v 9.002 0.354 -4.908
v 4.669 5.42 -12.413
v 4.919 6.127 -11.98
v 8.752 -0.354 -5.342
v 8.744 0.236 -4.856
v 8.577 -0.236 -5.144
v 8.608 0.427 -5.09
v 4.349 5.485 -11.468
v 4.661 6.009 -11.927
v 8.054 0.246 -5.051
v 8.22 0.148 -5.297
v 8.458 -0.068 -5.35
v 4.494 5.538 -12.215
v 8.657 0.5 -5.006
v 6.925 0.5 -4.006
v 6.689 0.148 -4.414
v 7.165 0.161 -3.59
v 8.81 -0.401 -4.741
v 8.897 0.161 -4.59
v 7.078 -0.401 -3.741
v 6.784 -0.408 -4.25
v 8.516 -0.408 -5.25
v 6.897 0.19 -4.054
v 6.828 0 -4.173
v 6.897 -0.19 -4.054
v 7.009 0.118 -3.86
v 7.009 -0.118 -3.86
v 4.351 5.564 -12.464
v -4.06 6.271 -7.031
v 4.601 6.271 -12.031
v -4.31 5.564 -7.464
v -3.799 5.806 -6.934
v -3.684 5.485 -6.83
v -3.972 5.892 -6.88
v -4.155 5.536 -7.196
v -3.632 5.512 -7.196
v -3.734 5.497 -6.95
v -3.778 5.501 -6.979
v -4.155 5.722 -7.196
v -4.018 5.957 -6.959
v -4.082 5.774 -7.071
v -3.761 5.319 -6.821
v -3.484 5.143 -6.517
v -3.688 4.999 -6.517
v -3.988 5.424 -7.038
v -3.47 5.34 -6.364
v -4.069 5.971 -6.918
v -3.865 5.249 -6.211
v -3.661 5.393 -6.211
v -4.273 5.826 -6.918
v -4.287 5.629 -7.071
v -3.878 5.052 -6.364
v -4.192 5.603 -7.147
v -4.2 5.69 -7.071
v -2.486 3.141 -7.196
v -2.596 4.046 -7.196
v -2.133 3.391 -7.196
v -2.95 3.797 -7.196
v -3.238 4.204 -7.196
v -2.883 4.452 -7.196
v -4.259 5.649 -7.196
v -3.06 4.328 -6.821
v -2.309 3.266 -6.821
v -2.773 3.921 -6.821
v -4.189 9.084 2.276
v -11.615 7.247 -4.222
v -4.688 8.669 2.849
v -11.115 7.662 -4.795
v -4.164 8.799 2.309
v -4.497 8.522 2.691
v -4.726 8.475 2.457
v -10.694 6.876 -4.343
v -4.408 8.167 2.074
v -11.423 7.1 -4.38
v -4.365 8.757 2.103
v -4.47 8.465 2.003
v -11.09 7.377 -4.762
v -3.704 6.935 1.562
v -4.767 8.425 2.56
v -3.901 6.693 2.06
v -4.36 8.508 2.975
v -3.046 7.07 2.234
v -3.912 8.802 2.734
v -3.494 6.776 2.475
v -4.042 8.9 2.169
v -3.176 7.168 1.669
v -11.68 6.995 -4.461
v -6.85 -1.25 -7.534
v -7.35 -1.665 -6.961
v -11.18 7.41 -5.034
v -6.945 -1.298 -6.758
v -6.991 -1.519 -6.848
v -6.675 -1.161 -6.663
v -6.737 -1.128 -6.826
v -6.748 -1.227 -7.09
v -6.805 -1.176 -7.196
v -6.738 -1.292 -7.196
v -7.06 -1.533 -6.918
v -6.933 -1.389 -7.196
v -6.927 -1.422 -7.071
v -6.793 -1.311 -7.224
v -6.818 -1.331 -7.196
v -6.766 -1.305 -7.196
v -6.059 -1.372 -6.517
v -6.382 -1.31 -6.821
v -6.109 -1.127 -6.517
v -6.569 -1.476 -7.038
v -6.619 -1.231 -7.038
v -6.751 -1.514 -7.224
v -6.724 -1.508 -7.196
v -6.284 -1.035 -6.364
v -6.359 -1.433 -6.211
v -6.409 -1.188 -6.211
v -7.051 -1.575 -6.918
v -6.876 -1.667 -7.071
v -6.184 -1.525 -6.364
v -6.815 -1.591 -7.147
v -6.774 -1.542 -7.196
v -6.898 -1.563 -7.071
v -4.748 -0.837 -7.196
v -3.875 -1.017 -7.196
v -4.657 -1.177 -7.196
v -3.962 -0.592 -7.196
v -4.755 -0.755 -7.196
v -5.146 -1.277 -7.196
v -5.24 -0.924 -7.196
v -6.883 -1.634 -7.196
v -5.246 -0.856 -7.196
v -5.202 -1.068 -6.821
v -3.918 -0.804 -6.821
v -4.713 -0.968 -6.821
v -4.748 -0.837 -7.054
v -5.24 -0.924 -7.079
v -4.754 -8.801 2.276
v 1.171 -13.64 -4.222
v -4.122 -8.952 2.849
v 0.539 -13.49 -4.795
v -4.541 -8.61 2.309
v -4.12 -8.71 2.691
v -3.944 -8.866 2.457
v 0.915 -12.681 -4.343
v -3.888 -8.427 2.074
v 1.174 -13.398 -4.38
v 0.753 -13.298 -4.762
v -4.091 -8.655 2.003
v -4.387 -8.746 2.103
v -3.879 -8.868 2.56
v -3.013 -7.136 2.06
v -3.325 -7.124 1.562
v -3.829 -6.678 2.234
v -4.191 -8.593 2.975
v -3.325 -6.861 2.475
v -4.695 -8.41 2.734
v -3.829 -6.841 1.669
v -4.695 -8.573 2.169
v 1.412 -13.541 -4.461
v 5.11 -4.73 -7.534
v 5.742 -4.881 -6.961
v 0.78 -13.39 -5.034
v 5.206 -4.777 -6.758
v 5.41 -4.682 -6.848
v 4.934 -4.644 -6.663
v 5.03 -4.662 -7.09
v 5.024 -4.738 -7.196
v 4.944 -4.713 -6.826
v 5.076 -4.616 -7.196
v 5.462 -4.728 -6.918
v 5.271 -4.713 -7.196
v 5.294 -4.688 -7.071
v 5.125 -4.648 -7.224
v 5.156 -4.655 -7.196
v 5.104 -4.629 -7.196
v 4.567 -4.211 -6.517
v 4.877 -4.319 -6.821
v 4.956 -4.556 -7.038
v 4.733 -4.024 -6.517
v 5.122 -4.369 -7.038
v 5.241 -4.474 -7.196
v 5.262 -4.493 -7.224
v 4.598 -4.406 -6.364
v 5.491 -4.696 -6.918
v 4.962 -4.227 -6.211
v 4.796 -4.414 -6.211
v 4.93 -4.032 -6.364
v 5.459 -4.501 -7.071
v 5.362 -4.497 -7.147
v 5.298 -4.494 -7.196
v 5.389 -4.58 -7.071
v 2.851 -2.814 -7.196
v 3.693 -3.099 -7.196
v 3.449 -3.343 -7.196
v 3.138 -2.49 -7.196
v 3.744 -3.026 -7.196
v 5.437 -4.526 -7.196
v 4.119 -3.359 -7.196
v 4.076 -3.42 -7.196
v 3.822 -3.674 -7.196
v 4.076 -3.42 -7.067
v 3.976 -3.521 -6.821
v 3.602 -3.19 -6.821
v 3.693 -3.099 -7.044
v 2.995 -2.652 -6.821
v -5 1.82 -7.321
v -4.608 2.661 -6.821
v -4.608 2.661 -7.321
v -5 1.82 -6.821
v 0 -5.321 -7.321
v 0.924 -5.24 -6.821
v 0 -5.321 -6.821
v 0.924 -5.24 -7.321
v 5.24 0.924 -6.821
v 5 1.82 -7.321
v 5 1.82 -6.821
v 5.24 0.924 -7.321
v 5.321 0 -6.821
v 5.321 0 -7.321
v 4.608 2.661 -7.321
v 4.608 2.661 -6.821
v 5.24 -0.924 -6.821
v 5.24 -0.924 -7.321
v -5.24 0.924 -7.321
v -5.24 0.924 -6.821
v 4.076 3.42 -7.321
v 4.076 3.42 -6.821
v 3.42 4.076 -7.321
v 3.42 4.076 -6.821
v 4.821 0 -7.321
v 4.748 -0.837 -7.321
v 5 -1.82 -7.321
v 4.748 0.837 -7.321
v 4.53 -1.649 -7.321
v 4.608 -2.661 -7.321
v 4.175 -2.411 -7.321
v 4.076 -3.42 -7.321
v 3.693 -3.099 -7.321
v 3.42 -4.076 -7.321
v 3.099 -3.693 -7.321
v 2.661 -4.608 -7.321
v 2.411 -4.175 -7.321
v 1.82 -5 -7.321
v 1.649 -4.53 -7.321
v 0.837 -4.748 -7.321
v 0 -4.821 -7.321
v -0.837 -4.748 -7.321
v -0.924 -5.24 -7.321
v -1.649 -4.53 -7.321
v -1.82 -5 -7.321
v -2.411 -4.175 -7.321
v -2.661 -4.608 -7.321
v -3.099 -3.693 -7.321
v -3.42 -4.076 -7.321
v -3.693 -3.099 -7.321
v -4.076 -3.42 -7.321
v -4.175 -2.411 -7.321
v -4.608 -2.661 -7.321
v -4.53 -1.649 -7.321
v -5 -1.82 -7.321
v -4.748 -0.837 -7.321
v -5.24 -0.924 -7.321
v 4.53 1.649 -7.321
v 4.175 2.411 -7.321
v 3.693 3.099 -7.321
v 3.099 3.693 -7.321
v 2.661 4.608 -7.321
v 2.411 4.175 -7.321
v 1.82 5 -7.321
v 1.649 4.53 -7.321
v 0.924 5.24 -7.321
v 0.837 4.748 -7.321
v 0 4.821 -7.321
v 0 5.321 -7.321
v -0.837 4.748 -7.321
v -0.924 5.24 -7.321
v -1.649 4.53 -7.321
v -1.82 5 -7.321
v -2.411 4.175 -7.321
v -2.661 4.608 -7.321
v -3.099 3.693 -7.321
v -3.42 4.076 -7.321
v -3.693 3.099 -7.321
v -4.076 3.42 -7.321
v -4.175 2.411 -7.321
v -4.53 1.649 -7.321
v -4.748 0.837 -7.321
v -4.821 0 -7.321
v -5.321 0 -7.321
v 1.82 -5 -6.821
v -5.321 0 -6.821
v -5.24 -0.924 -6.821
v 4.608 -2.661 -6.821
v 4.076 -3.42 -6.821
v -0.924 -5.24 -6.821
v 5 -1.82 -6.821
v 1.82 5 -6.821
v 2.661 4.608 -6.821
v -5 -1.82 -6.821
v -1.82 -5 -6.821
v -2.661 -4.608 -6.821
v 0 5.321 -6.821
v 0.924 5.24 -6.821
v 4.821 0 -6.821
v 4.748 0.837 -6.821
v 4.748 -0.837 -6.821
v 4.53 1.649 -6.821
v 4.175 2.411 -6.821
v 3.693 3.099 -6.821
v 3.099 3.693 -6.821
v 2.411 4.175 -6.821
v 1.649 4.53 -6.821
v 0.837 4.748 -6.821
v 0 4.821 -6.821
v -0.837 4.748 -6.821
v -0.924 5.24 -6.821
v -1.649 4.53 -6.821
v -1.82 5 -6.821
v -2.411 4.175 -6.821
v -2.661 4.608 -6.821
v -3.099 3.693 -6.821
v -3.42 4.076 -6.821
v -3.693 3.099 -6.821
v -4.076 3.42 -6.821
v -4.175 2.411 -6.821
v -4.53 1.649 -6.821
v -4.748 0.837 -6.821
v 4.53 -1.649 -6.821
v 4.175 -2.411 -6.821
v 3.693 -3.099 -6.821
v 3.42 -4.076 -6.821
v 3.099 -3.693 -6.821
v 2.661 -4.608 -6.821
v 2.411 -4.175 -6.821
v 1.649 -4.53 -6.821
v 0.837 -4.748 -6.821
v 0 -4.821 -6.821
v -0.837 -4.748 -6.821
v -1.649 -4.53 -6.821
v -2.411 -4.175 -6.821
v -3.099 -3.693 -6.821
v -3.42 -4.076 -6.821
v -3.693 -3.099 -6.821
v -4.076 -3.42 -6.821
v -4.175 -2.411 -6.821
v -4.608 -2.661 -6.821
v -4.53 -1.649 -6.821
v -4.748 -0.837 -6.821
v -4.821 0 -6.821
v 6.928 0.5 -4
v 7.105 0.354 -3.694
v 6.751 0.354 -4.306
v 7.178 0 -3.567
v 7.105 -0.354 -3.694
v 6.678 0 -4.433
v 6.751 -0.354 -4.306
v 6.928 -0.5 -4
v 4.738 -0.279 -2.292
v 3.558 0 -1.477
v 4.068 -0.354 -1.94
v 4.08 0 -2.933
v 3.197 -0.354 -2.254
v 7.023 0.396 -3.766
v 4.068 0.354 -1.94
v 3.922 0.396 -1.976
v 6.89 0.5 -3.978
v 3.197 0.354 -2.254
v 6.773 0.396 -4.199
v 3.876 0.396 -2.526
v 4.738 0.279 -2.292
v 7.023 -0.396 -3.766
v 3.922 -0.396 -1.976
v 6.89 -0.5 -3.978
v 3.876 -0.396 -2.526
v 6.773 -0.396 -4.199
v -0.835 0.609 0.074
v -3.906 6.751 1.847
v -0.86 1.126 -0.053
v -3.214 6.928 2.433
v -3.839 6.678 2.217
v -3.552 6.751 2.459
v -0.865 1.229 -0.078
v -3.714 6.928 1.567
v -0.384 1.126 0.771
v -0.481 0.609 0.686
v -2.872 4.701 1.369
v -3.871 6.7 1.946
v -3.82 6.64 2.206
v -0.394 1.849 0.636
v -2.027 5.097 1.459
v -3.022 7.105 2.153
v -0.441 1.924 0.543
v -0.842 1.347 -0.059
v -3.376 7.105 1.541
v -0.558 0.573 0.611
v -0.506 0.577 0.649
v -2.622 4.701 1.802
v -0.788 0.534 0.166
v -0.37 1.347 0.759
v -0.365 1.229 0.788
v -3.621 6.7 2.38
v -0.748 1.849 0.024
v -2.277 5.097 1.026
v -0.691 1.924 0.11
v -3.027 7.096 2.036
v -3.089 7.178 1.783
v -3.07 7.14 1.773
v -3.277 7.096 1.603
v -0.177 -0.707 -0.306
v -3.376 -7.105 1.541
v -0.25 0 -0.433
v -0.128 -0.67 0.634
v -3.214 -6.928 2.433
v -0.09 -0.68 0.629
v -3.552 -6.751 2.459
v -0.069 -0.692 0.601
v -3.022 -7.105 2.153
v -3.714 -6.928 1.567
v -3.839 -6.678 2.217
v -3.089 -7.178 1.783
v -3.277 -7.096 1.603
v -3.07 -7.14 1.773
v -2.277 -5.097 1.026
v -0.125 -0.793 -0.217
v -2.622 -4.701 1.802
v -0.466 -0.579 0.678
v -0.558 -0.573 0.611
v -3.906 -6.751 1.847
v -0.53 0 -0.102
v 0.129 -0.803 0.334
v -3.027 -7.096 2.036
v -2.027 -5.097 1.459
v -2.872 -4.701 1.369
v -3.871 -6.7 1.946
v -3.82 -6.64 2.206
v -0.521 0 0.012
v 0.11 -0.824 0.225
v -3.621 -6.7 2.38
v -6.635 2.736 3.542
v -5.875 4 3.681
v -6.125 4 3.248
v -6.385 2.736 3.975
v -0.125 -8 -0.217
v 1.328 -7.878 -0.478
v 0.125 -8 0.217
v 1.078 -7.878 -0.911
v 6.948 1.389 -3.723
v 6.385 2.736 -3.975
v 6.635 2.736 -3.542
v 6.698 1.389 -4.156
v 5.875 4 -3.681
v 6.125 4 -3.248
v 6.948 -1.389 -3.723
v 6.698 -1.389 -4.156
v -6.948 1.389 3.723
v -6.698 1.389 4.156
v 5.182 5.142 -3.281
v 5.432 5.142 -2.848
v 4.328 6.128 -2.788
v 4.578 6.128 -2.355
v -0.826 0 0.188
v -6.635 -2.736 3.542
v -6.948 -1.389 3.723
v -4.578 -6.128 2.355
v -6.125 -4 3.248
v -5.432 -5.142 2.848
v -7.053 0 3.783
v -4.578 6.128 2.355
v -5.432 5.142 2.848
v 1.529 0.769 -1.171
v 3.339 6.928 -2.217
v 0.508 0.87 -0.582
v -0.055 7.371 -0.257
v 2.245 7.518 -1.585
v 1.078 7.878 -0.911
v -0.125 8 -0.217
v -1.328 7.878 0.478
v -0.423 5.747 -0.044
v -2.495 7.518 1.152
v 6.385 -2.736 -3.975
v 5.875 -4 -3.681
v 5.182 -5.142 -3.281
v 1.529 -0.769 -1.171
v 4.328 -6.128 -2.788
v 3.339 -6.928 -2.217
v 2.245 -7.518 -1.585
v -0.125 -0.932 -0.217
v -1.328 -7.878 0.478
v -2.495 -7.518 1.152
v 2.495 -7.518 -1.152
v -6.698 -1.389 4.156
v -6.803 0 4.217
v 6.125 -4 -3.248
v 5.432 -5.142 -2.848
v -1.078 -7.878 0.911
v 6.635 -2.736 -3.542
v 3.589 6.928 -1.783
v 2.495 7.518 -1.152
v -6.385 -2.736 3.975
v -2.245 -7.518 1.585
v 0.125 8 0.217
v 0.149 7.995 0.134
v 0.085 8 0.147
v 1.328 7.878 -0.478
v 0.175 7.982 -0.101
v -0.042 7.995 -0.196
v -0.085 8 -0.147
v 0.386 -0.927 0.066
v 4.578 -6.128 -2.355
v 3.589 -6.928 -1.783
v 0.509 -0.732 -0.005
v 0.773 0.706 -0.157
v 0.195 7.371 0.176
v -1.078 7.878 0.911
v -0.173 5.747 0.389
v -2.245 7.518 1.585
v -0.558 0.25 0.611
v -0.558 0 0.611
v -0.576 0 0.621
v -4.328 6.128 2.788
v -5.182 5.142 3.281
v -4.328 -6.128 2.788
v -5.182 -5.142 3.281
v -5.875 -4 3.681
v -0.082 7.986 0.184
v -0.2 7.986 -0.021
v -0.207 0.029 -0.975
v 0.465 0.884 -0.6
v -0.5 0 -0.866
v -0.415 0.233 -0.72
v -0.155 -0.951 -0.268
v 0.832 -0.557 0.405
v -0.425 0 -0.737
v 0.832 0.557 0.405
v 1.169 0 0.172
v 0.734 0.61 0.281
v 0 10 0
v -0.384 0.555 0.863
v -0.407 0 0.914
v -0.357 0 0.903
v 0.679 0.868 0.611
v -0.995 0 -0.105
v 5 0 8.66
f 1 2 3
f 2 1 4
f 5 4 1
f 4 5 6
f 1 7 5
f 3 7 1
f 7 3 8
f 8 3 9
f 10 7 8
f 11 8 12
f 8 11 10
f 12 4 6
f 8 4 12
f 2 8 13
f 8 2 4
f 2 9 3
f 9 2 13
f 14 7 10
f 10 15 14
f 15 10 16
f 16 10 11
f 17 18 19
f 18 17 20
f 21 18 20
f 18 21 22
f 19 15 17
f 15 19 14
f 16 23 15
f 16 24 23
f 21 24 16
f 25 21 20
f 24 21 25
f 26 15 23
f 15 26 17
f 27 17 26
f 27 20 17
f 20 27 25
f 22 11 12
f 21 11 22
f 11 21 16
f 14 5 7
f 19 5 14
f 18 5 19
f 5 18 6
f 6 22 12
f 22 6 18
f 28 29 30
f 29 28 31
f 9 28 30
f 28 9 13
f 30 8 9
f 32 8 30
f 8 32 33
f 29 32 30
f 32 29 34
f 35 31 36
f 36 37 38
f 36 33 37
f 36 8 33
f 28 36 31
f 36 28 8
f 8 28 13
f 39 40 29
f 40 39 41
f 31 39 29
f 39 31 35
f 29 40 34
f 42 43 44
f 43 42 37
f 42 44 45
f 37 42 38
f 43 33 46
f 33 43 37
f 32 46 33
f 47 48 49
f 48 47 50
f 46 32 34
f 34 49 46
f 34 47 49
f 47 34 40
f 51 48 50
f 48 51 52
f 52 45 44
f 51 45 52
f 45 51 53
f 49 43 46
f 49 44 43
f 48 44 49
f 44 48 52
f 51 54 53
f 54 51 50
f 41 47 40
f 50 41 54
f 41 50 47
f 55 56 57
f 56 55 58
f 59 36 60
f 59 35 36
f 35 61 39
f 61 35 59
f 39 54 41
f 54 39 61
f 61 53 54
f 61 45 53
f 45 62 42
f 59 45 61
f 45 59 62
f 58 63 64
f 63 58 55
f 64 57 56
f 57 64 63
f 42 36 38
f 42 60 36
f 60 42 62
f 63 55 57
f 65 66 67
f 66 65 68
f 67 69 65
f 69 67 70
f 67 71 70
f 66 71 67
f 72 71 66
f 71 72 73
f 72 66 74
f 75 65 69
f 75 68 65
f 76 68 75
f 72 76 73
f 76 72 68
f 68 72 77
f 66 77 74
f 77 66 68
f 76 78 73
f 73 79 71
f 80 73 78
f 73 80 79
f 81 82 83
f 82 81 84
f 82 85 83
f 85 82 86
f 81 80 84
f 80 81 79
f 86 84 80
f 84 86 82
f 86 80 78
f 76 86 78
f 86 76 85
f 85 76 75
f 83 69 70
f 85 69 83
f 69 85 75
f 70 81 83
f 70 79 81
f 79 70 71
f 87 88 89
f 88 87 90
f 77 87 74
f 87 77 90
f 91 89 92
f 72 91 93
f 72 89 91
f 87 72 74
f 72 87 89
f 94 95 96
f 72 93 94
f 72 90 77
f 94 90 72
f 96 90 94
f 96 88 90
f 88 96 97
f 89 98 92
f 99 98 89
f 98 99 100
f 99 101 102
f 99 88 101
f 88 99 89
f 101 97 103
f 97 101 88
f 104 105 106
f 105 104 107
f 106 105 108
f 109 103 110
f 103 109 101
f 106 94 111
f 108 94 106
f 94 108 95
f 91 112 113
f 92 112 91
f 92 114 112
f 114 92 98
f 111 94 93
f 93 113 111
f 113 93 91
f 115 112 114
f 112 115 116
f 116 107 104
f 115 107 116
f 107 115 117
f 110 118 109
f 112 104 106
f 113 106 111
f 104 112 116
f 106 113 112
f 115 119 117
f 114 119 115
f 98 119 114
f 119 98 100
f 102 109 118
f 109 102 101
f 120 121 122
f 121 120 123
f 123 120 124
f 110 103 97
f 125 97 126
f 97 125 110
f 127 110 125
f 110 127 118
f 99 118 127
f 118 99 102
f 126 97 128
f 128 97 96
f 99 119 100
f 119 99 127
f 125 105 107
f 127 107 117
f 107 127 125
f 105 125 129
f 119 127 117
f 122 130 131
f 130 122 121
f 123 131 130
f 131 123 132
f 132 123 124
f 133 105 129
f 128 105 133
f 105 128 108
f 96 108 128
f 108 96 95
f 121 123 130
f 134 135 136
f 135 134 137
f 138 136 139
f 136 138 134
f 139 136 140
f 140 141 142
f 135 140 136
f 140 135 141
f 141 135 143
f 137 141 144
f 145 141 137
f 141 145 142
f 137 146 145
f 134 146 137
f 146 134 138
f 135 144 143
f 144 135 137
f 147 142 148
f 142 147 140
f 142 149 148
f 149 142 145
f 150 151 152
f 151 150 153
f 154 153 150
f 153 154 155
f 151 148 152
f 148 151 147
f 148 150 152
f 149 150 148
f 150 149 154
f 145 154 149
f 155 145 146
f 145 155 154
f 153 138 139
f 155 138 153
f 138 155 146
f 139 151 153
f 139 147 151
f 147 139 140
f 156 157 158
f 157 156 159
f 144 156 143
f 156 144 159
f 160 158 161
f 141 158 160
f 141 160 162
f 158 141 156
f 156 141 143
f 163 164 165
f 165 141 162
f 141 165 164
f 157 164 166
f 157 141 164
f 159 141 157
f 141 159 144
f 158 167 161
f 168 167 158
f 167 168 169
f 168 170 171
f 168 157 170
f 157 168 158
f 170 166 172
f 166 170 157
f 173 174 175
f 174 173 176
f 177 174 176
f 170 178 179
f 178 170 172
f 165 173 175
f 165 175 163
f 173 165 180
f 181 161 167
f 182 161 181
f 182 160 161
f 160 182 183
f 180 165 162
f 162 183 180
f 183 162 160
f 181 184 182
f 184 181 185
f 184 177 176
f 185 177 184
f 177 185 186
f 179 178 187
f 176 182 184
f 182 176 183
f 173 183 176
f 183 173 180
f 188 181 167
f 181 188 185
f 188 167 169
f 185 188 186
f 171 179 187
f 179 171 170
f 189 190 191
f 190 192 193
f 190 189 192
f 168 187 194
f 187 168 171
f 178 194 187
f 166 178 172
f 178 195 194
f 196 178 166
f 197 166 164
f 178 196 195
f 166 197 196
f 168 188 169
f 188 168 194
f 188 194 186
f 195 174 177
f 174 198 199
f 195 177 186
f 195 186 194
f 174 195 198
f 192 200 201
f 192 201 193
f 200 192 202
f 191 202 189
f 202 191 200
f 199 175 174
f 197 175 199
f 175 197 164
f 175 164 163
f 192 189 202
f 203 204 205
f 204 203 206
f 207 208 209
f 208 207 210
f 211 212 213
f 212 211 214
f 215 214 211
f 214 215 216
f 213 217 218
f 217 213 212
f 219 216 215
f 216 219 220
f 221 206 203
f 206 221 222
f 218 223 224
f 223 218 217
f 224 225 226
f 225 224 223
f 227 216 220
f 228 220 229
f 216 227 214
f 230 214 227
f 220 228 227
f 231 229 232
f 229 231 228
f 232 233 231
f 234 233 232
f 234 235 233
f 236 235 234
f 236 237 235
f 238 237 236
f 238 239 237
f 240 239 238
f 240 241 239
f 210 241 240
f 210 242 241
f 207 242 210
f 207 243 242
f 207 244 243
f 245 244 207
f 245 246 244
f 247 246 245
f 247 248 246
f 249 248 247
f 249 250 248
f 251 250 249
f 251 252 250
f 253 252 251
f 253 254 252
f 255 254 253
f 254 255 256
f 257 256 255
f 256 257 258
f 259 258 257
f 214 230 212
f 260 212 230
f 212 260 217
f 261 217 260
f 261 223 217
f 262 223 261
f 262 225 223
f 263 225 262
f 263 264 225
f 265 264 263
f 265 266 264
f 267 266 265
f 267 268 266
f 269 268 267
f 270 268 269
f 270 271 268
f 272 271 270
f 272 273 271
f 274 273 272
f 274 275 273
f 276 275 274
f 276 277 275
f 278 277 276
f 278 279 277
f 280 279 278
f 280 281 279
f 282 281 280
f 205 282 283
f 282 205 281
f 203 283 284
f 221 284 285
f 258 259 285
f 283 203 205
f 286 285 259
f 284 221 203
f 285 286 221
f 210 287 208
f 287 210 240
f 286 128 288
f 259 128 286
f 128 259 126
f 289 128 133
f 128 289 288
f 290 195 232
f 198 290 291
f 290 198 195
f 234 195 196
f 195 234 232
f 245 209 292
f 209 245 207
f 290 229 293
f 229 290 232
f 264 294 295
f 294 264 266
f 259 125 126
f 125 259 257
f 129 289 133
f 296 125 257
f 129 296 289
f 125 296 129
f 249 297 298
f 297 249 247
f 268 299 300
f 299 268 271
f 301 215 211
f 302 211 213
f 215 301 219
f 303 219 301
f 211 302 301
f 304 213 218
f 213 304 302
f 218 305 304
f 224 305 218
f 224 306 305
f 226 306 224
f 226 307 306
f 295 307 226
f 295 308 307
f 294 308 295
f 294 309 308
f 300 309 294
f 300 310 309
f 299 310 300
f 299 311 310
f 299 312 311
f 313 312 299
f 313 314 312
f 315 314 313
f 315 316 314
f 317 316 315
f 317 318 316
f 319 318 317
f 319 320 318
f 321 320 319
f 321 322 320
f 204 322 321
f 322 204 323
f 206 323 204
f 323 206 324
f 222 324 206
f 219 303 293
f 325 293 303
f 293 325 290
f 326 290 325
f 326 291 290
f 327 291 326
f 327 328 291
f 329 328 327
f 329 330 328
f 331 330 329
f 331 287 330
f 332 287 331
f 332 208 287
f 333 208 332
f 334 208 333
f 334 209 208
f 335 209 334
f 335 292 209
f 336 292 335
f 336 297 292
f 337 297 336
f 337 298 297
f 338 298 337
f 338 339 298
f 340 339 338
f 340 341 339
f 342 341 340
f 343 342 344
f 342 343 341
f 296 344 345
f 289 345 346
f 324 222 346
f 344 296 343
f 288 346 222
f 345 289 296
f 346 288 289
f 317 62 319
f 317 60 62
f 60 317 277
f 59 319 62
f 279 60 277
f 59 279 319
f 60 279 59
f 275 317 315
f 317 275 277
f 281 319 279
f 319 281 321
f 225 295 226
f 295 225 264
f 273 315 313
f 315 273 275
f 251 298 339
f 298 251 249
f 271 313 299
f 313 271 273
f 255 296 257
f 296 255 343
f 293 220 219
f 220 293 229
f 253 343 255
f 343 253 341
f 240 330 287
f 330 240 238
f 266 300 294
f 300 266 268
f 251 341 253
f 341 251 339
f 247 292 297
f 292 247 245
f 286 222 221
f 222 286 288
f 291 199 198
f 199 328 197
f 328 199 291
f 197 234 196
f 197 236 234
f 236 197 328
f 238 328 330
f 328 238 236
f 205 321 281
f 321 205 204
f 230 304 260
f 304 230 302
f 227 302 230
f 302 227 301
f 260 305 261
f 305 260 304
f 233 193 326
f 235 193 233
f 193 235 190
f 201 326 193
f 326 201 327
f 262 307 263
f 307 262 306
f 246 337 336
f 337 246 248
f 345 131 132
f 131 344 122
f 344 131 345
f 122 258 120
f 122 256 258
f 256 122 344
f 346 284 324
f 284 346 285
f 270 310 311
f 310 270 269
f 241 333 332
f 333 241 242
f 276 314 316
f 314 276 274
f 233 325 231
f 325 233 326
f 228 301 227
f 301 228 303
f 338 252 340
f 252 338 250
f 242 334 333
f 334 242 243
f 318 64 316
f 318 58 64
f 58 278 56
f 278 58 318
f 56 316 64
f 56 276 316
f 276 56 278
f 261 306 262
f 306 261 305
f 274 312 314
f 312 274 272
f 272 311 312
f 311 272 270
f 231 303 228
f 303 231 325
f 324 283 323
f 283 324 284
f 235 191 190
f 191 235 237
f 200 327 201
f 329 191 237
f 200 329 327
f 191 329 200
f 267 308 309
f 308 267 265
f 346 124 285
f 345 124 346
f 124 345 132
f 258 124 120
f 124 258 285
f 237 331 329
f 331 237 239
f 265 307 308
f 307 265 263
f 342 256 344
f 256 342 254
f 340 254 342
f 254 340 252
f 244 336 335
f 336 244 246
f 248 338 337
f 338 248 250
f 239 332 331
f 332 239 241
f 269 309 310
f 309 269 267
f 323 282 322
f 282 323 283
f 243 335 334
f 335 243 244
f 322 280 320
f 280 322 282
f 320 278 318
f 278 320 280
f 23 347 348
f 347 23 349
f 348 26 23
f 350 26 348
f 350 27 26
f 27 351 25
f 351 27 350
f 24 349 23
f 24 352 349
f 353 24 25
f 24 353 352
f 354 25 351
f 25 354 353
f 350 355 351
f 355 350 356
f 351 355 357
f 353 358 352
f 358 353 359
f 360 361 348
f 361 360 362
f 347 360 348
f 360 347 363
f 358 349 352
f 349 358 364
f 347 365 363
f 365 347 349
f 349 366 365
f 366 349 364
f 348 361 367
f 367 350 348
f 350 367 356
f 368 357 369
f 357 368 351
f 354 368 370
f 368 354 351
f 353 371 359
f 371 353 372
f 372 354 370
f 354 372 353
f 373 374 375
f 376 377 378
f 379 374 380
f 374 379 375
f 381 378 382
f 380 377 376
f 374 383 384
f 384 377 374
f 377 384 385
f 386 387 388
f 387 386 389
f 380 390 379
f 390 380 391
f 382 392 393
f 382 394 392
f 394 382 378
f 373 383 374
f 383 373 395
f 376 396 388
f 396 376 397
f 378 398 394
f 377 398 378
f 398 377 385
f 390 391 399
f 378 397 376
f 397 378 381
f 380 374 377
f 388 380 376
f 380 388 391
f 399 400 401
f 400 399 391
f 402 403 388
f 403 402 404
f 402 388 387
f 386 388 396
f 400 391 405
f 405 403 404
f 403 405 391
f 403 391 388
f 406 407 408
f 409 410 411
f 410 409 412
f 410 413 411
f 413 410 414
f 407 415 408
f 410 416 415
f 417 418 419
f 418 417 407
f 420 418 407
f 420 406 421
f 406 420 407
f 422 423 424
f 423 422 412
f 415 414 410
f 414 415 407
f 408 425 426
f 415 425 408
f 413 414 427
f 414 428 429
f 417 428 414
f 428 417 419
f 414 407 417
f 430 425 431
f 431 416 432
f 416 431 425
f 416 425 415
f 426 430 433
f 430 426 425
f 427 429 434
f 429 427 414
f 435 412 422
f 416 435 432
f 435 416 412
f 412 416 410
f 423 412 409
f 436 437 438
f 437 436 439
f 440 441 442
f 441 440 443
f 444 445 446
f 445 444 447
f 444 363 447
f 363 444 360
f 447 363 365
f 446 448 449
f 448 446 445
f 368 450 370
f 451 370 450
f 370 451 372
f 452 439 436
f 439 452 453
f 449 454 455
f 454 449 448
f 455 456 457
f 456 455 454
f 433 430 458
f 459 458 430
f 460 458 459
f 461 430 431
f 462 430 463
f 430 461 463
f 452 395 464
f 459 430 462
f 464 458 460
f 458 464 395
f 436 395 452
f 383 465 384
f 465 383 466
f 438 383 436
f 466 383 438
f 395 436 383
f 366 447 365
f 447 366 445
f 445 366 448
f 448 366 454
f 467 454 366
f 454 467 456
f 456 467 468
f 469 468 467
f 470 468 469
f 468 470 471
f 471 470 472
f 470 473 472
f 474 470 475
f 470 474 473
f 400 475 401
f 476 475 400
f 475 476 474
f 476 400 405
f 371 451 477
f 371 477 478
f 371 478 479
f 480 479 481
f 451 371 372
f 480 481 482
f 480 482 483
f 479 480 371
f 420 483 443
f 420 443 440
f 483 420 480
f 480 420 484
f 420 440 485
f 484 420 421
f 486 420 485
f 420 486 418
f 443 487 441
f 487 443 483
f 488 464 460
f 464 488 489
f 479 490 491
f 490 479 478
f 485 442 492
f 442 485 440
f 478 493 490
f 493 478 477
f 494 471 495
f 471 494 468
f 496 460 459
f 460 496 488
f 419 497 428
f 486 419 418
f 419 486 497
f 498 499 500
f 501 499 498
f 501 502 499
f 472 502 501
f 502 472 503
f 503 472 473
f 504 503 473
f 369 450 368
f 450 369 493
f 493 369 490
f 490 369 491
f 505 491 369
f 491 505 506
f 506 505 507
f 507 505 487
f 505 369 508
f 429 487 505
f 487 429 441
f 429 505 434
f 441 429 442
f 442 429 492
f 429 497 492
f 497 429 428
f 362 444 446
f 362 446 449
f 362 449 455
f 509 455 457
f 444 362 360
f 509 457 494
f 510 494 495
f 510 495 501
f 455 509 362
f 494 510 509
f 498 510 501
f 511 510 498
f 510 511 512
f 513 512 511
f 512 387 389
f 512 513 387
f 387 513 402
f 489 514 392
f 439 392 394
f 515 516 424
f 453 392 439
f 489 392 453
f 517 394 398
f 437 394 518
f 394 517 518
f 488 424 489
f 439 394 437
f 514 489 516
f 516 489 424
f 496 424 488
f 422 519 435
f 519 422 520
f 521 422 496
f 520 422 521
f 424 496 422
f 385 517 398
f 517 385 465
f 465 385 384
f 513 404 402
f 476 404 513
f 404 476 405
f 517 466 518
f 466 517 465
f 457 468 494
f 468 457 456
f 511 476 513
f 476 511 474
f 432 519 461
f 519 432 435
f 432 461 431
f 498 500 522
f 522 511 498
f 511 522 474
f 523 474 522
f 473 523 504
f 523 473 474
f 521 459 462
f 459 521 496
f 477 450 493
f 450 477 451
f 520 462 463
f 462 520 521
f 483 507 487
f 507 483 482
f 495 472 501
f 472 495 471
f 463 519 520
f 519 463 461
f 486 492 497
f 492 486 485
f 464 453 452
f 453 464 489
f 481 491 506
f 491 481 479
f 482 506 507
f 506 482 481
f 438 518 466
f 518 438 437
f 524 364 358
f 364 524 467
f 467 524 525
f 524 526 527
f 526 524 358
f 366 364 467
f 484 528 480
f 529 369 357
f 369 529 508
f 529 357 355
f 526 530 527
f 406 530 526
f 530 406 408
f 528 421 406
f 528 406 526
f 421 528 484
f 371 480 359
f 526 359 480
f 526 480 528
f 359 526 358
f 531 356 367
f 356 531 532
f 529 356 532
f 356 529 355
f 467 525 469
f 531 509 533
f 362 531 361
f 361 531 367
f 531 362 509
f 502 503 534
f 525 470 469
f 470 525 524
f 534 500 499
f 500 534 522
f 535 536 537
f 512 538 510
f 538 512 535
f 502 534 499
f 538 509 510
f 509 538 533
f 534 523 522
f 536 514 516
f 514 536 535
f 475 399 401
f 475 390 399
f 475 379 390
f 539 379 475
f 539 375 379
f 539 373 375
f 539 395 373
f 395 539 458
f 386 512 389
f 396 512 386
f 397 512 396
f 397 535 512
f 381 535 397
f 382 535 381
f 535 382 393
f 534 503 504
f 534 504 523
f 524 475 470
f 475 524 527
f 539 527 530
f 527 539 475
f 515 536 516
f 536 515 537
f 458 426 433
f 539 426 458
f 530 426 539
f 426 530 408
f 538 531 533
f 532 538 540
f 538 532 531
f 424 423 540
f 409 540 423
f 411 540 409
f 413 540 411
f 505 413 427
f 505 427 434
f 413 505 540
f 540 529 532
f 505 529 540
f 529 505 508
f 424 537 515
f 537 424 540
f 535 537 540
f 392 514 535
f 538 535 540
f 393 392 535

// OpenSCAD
function transform(v, q) = [v, q];
function vector(x=0, y=0, z=0) = [x, y, z];
function quaternion(w=1, x=0, y=0, z=0) = [w, x, y, z];

function vmagn(v) = sqrt(v[0]*v[0] + v[1]*v[1] + v[2]*v[2]);
function vnorm(v) = [v[0]/vmagn(v), v[1]/vmagn(v), v[2]/vmagn(v)];

function qmul(q0, q1) = [
    q0[0]*q1[0] - q0[1]*q1[1] - q0[2]*q1[2] - q0[3]*q1[3],
    q0[0]*q1[1] + q0[1]*q1[0] + q0[2]*q1[3] - q0[3]*q1[2],
    q0[0]*q1[2] - q0[1]*q1[3] + q0[2]*q1[0] + q0[3]*q1[1],
    q0[0]*q1[3] + q0[1]*q1[2] - q0[2]*q1[1] + q0[3]*q1[0]
];

function qrev(q) = [q[0], -q[1], -q[2], -q[3]];

function qrot(q, v) = qvec(qmul(
    qmul(q, quaternion(0, v[0], v[1], v[2])),
    qrev(q)
));

function qaxis(ang, v) = [
    cos(ang/2),
    vnorm(v)[0]*sin(ang/2),
    vnorm(v)[1]*sin(ang/2),
    vnorm(v)[2]*sin(ang/2)
];

function qvec(q) = [q[1], q[2], q[3]];

function qmagn(q) = sqrt(q[0]*q[0] + q[1]*q[1] + q[2]*q[2] + q[3]*q[3]);

function vdot(v0, v1) = v0[0]*v1[0] + v0[1]*v1[1] + v0[2]*v1[2];

function vcross(v0, v1) = [
    v0[1]*v1[2] - v0[2]*v1[1],
    v0[2]*v1[0] - v0[0]*v1[2],
    v0[0]*v1[1] - v0[1]*v1[0]
];

function angle_to(v0, v1, a) = atan2(vmagn(vcross(v0, v1)), vdot(v0, v1)) * (vdot(vcross(v0, v1), a) > 0 ? 1 : -1);

module rotation(q) {
    m = qmagn(q);
    ang = acos(q[0]/m);
    s = sin(ang)*sign(ang);
    rotate(ang*2, [s*q[1]/m, s*q[2]/m, s*q[3]/m]) children();
}

module axis(h=1) {
    color("red") rotate(90, [0, 1, 0]) cylinder(h=h, d1=0.2*h, d2=0);
    color("green") rotate(90, [-1, 0, 0]) cylinder(h=h, d1=0.2*h, d2=0);
    color("blue") cylinder(h=h, d1=0.2*h, d2=0);
}

i = -1;

rp = 8;
leg_h = 20;
leg_r = sqrt(2)/4 * leg_h;

angle_z = 0;
angle_y = 30 * cos($t * 360);
angle_x = ($t < 0.5) ? 30 * sin($t * 360) : 0;
targ_ori = qmul(
    qaxis(angle_z, [0, 0, 1]),
    qmul(
        qaxis(angle_y, [0, 1, 0]),
        qaxis(angle_x, [1, 0, 0])
    )
);

module platform() {
    union() {
        cylinder(h=0.5, r=rp, center=true, $fn=36);
        for (i = [0, 120, 240]) {
            rotate(i, [0, 0, 1]) rotate(90, [0, 1, 0]) cylinder(h=rp, d=1, $fn=8);
        }
    }
}

module ring(r) {
    difference() {
        cylinder(r=r+0.25, h=0.5, center=true, $fn=36);
        cylinder(r=r-0.25, h=1, center=true, $fn=36);
    }
}

ori0 = qrot(qmul(targ_ori, qaxis(-90, [0, 1, 0])), [0, 0, 1]);
alpha0 = i * acos(-sqrt(2) * ori0[2]);
mx0 = sin(alpha0);
my0 = -sqrt(2) * cos(alpha0) / 2;
q0 = angle_to([mx0, my0, 0], [ori0[0], ori0[1], 0], [0, 0, 1]);

ori1 = qrot(qmul(qmul(targ_ori, qaxis(120, [0, 0, 1])), qaxis(-90, [0, 1, 0])), [0, 0, 1]);
alpha1 = i * acos(-sqrt(2) * ori1[2]);
mx1 = sin(alpha1);
my1 = -sqrt(2) * cos(alpha1) / 2;
q1 = angle_to([mx1, my1, 0], [ori1[0], ori1[1], 0], [0, 0, 1]);

ori2 = qrot(qmul(qmul(targ_ori, qaxis(240, [0, 0, 1])), qaxis(-90, [0, 1, 0])), [0, 0, 1]);
alpha2 = i * acos(-sqrt(2) * ori2[2]);
mx2 = sin(alpha2);
my2 = -sqrt(2) * cos(alpha2) / 2;
q2 = angle_to([mx2, my2, 0], [ori2[0], ori2[1], 0], [0, 0, 1]);

module arm(q, alpha, col) {
    translate([0, 0, -leg_r]) rotate(q, [0, 0, 1]) {
        rotate(-90, [1, 0, 0]) translate([0, 0, 4]) rotate(30, [0, 0, 1]) cylinder(r=0.25, h=leg_r-4, $fn=3);
        translate([0, leg_r, 0]) rotate(45, [1, 0, 0]) {
            cylinder(h=1, r=0.25, $fn=6);
            color(col) rotate(alpha, [0, 0, 1]) rotate(-90, [1, 0, 0]) {
                rotate(30, [0, 0, 1]) cylinder(r=0.5, h=leg_h/2, $fn=3);
                translate([0, 0, leg_h/2]) rotate(90, [1, 0, 0]) {
                    rotate(30, [0, 0, 1]) cylinder(r=0.5, h=leg_h/2, $fn=3);
                    translate([0, 0, leg_h/2]) rotate(90, [1, 0, 0]) color("#0000ff") cylinder(h=2, r=0.5);
                }
            }
        }
    }
}

arm(q0, alpha0, "#ff8000");
arm(q1, alpha1, "#00ff80");
arm(q2, alpha2, "#8000ff");
translate([0, 0, -leg_r]) ring(leg_r-2);
rotation(targ_ori) {
    platform();
    axis(h=10);
}
